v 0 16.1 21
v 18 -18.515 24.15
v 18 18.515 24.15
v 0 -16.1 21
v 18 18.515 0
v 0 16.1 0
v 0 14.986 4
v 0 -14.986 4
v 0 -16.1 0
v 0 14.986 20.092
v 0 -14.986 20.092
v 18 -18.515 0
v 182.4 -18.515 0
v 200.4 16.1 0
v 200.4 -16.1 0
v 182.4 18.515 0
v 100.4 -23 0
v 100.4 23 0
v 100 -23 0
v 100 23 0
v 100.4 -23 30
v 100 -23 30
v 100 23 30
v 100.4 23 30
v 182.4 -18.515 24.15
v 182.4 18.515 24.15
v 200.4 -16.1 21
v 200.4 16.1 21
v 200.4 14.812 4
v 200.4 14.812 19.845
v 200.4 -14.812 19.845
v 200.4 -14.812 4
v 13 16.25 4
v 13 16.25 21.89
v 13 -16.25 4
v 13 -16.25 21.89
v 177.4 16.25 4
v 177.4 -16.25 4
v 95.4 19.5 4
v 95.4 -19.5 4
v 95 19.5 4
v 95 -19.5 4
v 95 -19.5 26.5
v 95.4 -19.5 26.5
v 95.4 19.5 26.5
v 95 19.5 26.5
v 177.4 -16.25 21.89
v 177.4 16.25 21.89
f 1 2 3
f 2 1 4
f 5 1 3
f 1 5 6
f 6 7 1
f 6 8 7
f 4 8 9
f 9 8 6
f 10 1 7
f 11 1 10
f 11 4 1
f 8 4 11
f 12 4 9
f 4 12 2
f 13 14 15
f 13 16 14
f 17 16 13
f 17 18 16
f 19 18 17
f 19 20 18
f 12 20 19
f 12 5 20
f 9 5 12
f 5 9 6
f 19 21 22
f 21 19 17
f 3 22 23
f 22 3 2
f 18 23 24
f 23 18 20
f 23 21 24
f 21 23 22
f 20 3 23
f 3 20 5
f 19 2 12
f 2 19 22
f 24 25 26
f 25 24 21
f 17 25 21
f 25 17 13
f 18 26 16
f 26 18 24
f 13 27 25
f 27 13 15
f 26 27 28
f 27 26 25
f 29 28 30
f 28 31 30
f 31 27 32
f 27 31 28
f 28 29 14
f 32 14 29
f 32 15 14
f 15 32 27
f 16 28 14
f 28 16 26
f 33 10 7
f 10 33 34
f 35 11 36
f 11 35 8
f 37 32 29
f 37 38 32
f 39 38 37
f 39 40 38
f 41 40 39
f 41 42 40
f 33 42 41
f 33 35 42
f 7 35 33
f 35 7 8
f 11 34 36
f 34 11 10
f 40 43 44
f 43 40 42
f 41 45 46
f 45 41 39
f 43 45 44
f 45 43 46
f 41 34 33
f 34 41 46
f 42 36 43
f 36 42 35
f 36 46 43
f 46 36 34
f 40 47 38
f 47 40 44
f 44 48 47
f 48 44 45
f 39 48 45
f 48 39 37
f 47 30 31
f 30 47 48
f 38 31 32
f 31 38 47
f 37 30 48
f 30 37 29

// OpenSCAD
$fn = 32;

// ----------------------------------------------------------------------
// Faired channel: 200 x 46 x 30 mm, 3.5 mm walls, faired ends
// ----------------------------------------------------------------------

// --- parameters (mm) ---
length = 200;             // channel length
width = 46;               // channel width at mid length
height = 30;              // channel height at mid length
wall = 3.5;               // side wall thickness
floor_t = 4;              // floor thickness
end_w = 32.2;             // faired end width
end_h = 21;               // faired end height

difference() {
  union() {
    hull() {
      translate([0, -16.1, 0]) cube([0.4, 32.2, 21]);
      translate([18, -18.515, 0]) cube([0.4, 37.03, 24.15]);
    }
    hull() {
      translate([18, -18.515, 0]) cube([0.4, 37.03, 24.15]);
      translate([100, -23, 0]) cube([0.4, 46, 30]);
    }
    hull() {
      translate([100, -23, 0]) cube([0.4, 46, 30]);
      translate([182, -18.515, 0]) cube([0.4, 37.03, 24.15]);
    }
    hull() {
      translate([182, -18.515, 0]) cube([0.4, 37.03, 24.15]);
      translate([200, -16.1, 0]) cube([0.4, 32.2, 21]);
    }
  }
  /* cavity, 5 mm proud of both ends so the ports are cut clean */
  hull() {
    translate([-5, -14.5, 4]) cube([0.4, 29, 15.4]);
    translate([13, -16.25, 4]) cube([0.4, 32.5, 17.89]);
  }
  hull() {
    translate([13, -16.25, 4]) cube([0.4, 32.5, 17.89]);
    translate([95, -19.5, 4]) cube([0.4, 39, 22.5]);
  }
  hull() {
    translate([95, -19.5, 4]) cube([0.4, 39, 22.5]);
    translate([177, -16.25, 4]) cube([0.4, 32.5, 17.89]);
  }
  hull() {
    translate([177, -16.25, 4]) cube([0.4, 32.5, 17.89]);
    translate([205, -14.5, 4]) cube([0.4, 29, 15.4]);
  }
}
